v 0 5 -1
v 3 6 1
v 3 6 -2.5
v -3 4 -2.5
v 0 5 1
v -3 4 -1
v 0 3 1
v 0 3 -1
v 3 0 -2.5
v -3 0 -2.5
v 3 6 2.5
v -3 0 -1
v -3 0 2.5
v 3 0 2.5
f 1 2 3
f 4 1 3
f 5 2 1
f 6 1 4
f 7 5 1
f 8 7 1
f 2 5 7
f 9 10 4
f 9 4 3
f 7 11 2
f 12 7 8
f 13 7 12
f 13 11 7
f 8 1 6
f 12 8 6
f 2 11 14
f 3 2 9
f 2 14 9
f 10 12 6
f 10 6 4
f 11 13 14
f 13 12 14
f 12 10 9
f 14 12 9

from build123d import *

# Parameters (mm, degrees)
SKETCH1_W           = 6
SKETCH1_H           = 5
BOSS_EXTRUDE1_DEPTH = 6
CUT_EXTRUDE1_DEPTH  = 3.5
SKETCH3_W           = 3
SKETCH3_H           = 2
BOSS_EXTRUDE2_DEPTH = 3
CUT_EXTRUDE2_DEPTH  = 3.5


with BuildPart() as part:
    # Sketch1 → Boss-Extrude1 (new body)
    with BuildSketch(Plane(origin=(0, 0, 0), x_dir=(1, 0, 0), z_dir=(0, 1, 0))):
        Rectangle(SKETCH1_W, SKETCH1_H)
    extrude(amount=BOSS_EXTRUDE1_DEPTH)

    # Sketch2 → Cut-Extrude1 (cut)
    with BuildSketch(Plane.XY.offset(2.5)):
        Polygon((3, 6), (-3, 0), (-3, 6), align=None)
    extrude(amount=-CUT_EXTRUDE1_DEPTH, mode=Mode.SUBTRACT)

    # Sketch3 → Boss-Extrude2 (add)
    with BuildSketch(Plane(origin=(0, 6, 0), x_dir=(1, 0, 0), z_dir=(0, 1, 0))):
        with Locations((1.5, 0)):
            Rectangle(SKETCH3_W, SKETCH3_H)
    extrude(amount=-BOSS_EXTRUDE2_DEPTH)

    # Sketch4 → Cut-Extrude2 (cut)
    with BuildSketch(Plane.XY.offset(1)):
        Polygon((3, 6), (-3, 4), (-3, 6), align=None)
    extrude(amount=-CUT_EXTRUDE2_DEPTH, mode=Mode.SUBTRACT)


solid = part.part
